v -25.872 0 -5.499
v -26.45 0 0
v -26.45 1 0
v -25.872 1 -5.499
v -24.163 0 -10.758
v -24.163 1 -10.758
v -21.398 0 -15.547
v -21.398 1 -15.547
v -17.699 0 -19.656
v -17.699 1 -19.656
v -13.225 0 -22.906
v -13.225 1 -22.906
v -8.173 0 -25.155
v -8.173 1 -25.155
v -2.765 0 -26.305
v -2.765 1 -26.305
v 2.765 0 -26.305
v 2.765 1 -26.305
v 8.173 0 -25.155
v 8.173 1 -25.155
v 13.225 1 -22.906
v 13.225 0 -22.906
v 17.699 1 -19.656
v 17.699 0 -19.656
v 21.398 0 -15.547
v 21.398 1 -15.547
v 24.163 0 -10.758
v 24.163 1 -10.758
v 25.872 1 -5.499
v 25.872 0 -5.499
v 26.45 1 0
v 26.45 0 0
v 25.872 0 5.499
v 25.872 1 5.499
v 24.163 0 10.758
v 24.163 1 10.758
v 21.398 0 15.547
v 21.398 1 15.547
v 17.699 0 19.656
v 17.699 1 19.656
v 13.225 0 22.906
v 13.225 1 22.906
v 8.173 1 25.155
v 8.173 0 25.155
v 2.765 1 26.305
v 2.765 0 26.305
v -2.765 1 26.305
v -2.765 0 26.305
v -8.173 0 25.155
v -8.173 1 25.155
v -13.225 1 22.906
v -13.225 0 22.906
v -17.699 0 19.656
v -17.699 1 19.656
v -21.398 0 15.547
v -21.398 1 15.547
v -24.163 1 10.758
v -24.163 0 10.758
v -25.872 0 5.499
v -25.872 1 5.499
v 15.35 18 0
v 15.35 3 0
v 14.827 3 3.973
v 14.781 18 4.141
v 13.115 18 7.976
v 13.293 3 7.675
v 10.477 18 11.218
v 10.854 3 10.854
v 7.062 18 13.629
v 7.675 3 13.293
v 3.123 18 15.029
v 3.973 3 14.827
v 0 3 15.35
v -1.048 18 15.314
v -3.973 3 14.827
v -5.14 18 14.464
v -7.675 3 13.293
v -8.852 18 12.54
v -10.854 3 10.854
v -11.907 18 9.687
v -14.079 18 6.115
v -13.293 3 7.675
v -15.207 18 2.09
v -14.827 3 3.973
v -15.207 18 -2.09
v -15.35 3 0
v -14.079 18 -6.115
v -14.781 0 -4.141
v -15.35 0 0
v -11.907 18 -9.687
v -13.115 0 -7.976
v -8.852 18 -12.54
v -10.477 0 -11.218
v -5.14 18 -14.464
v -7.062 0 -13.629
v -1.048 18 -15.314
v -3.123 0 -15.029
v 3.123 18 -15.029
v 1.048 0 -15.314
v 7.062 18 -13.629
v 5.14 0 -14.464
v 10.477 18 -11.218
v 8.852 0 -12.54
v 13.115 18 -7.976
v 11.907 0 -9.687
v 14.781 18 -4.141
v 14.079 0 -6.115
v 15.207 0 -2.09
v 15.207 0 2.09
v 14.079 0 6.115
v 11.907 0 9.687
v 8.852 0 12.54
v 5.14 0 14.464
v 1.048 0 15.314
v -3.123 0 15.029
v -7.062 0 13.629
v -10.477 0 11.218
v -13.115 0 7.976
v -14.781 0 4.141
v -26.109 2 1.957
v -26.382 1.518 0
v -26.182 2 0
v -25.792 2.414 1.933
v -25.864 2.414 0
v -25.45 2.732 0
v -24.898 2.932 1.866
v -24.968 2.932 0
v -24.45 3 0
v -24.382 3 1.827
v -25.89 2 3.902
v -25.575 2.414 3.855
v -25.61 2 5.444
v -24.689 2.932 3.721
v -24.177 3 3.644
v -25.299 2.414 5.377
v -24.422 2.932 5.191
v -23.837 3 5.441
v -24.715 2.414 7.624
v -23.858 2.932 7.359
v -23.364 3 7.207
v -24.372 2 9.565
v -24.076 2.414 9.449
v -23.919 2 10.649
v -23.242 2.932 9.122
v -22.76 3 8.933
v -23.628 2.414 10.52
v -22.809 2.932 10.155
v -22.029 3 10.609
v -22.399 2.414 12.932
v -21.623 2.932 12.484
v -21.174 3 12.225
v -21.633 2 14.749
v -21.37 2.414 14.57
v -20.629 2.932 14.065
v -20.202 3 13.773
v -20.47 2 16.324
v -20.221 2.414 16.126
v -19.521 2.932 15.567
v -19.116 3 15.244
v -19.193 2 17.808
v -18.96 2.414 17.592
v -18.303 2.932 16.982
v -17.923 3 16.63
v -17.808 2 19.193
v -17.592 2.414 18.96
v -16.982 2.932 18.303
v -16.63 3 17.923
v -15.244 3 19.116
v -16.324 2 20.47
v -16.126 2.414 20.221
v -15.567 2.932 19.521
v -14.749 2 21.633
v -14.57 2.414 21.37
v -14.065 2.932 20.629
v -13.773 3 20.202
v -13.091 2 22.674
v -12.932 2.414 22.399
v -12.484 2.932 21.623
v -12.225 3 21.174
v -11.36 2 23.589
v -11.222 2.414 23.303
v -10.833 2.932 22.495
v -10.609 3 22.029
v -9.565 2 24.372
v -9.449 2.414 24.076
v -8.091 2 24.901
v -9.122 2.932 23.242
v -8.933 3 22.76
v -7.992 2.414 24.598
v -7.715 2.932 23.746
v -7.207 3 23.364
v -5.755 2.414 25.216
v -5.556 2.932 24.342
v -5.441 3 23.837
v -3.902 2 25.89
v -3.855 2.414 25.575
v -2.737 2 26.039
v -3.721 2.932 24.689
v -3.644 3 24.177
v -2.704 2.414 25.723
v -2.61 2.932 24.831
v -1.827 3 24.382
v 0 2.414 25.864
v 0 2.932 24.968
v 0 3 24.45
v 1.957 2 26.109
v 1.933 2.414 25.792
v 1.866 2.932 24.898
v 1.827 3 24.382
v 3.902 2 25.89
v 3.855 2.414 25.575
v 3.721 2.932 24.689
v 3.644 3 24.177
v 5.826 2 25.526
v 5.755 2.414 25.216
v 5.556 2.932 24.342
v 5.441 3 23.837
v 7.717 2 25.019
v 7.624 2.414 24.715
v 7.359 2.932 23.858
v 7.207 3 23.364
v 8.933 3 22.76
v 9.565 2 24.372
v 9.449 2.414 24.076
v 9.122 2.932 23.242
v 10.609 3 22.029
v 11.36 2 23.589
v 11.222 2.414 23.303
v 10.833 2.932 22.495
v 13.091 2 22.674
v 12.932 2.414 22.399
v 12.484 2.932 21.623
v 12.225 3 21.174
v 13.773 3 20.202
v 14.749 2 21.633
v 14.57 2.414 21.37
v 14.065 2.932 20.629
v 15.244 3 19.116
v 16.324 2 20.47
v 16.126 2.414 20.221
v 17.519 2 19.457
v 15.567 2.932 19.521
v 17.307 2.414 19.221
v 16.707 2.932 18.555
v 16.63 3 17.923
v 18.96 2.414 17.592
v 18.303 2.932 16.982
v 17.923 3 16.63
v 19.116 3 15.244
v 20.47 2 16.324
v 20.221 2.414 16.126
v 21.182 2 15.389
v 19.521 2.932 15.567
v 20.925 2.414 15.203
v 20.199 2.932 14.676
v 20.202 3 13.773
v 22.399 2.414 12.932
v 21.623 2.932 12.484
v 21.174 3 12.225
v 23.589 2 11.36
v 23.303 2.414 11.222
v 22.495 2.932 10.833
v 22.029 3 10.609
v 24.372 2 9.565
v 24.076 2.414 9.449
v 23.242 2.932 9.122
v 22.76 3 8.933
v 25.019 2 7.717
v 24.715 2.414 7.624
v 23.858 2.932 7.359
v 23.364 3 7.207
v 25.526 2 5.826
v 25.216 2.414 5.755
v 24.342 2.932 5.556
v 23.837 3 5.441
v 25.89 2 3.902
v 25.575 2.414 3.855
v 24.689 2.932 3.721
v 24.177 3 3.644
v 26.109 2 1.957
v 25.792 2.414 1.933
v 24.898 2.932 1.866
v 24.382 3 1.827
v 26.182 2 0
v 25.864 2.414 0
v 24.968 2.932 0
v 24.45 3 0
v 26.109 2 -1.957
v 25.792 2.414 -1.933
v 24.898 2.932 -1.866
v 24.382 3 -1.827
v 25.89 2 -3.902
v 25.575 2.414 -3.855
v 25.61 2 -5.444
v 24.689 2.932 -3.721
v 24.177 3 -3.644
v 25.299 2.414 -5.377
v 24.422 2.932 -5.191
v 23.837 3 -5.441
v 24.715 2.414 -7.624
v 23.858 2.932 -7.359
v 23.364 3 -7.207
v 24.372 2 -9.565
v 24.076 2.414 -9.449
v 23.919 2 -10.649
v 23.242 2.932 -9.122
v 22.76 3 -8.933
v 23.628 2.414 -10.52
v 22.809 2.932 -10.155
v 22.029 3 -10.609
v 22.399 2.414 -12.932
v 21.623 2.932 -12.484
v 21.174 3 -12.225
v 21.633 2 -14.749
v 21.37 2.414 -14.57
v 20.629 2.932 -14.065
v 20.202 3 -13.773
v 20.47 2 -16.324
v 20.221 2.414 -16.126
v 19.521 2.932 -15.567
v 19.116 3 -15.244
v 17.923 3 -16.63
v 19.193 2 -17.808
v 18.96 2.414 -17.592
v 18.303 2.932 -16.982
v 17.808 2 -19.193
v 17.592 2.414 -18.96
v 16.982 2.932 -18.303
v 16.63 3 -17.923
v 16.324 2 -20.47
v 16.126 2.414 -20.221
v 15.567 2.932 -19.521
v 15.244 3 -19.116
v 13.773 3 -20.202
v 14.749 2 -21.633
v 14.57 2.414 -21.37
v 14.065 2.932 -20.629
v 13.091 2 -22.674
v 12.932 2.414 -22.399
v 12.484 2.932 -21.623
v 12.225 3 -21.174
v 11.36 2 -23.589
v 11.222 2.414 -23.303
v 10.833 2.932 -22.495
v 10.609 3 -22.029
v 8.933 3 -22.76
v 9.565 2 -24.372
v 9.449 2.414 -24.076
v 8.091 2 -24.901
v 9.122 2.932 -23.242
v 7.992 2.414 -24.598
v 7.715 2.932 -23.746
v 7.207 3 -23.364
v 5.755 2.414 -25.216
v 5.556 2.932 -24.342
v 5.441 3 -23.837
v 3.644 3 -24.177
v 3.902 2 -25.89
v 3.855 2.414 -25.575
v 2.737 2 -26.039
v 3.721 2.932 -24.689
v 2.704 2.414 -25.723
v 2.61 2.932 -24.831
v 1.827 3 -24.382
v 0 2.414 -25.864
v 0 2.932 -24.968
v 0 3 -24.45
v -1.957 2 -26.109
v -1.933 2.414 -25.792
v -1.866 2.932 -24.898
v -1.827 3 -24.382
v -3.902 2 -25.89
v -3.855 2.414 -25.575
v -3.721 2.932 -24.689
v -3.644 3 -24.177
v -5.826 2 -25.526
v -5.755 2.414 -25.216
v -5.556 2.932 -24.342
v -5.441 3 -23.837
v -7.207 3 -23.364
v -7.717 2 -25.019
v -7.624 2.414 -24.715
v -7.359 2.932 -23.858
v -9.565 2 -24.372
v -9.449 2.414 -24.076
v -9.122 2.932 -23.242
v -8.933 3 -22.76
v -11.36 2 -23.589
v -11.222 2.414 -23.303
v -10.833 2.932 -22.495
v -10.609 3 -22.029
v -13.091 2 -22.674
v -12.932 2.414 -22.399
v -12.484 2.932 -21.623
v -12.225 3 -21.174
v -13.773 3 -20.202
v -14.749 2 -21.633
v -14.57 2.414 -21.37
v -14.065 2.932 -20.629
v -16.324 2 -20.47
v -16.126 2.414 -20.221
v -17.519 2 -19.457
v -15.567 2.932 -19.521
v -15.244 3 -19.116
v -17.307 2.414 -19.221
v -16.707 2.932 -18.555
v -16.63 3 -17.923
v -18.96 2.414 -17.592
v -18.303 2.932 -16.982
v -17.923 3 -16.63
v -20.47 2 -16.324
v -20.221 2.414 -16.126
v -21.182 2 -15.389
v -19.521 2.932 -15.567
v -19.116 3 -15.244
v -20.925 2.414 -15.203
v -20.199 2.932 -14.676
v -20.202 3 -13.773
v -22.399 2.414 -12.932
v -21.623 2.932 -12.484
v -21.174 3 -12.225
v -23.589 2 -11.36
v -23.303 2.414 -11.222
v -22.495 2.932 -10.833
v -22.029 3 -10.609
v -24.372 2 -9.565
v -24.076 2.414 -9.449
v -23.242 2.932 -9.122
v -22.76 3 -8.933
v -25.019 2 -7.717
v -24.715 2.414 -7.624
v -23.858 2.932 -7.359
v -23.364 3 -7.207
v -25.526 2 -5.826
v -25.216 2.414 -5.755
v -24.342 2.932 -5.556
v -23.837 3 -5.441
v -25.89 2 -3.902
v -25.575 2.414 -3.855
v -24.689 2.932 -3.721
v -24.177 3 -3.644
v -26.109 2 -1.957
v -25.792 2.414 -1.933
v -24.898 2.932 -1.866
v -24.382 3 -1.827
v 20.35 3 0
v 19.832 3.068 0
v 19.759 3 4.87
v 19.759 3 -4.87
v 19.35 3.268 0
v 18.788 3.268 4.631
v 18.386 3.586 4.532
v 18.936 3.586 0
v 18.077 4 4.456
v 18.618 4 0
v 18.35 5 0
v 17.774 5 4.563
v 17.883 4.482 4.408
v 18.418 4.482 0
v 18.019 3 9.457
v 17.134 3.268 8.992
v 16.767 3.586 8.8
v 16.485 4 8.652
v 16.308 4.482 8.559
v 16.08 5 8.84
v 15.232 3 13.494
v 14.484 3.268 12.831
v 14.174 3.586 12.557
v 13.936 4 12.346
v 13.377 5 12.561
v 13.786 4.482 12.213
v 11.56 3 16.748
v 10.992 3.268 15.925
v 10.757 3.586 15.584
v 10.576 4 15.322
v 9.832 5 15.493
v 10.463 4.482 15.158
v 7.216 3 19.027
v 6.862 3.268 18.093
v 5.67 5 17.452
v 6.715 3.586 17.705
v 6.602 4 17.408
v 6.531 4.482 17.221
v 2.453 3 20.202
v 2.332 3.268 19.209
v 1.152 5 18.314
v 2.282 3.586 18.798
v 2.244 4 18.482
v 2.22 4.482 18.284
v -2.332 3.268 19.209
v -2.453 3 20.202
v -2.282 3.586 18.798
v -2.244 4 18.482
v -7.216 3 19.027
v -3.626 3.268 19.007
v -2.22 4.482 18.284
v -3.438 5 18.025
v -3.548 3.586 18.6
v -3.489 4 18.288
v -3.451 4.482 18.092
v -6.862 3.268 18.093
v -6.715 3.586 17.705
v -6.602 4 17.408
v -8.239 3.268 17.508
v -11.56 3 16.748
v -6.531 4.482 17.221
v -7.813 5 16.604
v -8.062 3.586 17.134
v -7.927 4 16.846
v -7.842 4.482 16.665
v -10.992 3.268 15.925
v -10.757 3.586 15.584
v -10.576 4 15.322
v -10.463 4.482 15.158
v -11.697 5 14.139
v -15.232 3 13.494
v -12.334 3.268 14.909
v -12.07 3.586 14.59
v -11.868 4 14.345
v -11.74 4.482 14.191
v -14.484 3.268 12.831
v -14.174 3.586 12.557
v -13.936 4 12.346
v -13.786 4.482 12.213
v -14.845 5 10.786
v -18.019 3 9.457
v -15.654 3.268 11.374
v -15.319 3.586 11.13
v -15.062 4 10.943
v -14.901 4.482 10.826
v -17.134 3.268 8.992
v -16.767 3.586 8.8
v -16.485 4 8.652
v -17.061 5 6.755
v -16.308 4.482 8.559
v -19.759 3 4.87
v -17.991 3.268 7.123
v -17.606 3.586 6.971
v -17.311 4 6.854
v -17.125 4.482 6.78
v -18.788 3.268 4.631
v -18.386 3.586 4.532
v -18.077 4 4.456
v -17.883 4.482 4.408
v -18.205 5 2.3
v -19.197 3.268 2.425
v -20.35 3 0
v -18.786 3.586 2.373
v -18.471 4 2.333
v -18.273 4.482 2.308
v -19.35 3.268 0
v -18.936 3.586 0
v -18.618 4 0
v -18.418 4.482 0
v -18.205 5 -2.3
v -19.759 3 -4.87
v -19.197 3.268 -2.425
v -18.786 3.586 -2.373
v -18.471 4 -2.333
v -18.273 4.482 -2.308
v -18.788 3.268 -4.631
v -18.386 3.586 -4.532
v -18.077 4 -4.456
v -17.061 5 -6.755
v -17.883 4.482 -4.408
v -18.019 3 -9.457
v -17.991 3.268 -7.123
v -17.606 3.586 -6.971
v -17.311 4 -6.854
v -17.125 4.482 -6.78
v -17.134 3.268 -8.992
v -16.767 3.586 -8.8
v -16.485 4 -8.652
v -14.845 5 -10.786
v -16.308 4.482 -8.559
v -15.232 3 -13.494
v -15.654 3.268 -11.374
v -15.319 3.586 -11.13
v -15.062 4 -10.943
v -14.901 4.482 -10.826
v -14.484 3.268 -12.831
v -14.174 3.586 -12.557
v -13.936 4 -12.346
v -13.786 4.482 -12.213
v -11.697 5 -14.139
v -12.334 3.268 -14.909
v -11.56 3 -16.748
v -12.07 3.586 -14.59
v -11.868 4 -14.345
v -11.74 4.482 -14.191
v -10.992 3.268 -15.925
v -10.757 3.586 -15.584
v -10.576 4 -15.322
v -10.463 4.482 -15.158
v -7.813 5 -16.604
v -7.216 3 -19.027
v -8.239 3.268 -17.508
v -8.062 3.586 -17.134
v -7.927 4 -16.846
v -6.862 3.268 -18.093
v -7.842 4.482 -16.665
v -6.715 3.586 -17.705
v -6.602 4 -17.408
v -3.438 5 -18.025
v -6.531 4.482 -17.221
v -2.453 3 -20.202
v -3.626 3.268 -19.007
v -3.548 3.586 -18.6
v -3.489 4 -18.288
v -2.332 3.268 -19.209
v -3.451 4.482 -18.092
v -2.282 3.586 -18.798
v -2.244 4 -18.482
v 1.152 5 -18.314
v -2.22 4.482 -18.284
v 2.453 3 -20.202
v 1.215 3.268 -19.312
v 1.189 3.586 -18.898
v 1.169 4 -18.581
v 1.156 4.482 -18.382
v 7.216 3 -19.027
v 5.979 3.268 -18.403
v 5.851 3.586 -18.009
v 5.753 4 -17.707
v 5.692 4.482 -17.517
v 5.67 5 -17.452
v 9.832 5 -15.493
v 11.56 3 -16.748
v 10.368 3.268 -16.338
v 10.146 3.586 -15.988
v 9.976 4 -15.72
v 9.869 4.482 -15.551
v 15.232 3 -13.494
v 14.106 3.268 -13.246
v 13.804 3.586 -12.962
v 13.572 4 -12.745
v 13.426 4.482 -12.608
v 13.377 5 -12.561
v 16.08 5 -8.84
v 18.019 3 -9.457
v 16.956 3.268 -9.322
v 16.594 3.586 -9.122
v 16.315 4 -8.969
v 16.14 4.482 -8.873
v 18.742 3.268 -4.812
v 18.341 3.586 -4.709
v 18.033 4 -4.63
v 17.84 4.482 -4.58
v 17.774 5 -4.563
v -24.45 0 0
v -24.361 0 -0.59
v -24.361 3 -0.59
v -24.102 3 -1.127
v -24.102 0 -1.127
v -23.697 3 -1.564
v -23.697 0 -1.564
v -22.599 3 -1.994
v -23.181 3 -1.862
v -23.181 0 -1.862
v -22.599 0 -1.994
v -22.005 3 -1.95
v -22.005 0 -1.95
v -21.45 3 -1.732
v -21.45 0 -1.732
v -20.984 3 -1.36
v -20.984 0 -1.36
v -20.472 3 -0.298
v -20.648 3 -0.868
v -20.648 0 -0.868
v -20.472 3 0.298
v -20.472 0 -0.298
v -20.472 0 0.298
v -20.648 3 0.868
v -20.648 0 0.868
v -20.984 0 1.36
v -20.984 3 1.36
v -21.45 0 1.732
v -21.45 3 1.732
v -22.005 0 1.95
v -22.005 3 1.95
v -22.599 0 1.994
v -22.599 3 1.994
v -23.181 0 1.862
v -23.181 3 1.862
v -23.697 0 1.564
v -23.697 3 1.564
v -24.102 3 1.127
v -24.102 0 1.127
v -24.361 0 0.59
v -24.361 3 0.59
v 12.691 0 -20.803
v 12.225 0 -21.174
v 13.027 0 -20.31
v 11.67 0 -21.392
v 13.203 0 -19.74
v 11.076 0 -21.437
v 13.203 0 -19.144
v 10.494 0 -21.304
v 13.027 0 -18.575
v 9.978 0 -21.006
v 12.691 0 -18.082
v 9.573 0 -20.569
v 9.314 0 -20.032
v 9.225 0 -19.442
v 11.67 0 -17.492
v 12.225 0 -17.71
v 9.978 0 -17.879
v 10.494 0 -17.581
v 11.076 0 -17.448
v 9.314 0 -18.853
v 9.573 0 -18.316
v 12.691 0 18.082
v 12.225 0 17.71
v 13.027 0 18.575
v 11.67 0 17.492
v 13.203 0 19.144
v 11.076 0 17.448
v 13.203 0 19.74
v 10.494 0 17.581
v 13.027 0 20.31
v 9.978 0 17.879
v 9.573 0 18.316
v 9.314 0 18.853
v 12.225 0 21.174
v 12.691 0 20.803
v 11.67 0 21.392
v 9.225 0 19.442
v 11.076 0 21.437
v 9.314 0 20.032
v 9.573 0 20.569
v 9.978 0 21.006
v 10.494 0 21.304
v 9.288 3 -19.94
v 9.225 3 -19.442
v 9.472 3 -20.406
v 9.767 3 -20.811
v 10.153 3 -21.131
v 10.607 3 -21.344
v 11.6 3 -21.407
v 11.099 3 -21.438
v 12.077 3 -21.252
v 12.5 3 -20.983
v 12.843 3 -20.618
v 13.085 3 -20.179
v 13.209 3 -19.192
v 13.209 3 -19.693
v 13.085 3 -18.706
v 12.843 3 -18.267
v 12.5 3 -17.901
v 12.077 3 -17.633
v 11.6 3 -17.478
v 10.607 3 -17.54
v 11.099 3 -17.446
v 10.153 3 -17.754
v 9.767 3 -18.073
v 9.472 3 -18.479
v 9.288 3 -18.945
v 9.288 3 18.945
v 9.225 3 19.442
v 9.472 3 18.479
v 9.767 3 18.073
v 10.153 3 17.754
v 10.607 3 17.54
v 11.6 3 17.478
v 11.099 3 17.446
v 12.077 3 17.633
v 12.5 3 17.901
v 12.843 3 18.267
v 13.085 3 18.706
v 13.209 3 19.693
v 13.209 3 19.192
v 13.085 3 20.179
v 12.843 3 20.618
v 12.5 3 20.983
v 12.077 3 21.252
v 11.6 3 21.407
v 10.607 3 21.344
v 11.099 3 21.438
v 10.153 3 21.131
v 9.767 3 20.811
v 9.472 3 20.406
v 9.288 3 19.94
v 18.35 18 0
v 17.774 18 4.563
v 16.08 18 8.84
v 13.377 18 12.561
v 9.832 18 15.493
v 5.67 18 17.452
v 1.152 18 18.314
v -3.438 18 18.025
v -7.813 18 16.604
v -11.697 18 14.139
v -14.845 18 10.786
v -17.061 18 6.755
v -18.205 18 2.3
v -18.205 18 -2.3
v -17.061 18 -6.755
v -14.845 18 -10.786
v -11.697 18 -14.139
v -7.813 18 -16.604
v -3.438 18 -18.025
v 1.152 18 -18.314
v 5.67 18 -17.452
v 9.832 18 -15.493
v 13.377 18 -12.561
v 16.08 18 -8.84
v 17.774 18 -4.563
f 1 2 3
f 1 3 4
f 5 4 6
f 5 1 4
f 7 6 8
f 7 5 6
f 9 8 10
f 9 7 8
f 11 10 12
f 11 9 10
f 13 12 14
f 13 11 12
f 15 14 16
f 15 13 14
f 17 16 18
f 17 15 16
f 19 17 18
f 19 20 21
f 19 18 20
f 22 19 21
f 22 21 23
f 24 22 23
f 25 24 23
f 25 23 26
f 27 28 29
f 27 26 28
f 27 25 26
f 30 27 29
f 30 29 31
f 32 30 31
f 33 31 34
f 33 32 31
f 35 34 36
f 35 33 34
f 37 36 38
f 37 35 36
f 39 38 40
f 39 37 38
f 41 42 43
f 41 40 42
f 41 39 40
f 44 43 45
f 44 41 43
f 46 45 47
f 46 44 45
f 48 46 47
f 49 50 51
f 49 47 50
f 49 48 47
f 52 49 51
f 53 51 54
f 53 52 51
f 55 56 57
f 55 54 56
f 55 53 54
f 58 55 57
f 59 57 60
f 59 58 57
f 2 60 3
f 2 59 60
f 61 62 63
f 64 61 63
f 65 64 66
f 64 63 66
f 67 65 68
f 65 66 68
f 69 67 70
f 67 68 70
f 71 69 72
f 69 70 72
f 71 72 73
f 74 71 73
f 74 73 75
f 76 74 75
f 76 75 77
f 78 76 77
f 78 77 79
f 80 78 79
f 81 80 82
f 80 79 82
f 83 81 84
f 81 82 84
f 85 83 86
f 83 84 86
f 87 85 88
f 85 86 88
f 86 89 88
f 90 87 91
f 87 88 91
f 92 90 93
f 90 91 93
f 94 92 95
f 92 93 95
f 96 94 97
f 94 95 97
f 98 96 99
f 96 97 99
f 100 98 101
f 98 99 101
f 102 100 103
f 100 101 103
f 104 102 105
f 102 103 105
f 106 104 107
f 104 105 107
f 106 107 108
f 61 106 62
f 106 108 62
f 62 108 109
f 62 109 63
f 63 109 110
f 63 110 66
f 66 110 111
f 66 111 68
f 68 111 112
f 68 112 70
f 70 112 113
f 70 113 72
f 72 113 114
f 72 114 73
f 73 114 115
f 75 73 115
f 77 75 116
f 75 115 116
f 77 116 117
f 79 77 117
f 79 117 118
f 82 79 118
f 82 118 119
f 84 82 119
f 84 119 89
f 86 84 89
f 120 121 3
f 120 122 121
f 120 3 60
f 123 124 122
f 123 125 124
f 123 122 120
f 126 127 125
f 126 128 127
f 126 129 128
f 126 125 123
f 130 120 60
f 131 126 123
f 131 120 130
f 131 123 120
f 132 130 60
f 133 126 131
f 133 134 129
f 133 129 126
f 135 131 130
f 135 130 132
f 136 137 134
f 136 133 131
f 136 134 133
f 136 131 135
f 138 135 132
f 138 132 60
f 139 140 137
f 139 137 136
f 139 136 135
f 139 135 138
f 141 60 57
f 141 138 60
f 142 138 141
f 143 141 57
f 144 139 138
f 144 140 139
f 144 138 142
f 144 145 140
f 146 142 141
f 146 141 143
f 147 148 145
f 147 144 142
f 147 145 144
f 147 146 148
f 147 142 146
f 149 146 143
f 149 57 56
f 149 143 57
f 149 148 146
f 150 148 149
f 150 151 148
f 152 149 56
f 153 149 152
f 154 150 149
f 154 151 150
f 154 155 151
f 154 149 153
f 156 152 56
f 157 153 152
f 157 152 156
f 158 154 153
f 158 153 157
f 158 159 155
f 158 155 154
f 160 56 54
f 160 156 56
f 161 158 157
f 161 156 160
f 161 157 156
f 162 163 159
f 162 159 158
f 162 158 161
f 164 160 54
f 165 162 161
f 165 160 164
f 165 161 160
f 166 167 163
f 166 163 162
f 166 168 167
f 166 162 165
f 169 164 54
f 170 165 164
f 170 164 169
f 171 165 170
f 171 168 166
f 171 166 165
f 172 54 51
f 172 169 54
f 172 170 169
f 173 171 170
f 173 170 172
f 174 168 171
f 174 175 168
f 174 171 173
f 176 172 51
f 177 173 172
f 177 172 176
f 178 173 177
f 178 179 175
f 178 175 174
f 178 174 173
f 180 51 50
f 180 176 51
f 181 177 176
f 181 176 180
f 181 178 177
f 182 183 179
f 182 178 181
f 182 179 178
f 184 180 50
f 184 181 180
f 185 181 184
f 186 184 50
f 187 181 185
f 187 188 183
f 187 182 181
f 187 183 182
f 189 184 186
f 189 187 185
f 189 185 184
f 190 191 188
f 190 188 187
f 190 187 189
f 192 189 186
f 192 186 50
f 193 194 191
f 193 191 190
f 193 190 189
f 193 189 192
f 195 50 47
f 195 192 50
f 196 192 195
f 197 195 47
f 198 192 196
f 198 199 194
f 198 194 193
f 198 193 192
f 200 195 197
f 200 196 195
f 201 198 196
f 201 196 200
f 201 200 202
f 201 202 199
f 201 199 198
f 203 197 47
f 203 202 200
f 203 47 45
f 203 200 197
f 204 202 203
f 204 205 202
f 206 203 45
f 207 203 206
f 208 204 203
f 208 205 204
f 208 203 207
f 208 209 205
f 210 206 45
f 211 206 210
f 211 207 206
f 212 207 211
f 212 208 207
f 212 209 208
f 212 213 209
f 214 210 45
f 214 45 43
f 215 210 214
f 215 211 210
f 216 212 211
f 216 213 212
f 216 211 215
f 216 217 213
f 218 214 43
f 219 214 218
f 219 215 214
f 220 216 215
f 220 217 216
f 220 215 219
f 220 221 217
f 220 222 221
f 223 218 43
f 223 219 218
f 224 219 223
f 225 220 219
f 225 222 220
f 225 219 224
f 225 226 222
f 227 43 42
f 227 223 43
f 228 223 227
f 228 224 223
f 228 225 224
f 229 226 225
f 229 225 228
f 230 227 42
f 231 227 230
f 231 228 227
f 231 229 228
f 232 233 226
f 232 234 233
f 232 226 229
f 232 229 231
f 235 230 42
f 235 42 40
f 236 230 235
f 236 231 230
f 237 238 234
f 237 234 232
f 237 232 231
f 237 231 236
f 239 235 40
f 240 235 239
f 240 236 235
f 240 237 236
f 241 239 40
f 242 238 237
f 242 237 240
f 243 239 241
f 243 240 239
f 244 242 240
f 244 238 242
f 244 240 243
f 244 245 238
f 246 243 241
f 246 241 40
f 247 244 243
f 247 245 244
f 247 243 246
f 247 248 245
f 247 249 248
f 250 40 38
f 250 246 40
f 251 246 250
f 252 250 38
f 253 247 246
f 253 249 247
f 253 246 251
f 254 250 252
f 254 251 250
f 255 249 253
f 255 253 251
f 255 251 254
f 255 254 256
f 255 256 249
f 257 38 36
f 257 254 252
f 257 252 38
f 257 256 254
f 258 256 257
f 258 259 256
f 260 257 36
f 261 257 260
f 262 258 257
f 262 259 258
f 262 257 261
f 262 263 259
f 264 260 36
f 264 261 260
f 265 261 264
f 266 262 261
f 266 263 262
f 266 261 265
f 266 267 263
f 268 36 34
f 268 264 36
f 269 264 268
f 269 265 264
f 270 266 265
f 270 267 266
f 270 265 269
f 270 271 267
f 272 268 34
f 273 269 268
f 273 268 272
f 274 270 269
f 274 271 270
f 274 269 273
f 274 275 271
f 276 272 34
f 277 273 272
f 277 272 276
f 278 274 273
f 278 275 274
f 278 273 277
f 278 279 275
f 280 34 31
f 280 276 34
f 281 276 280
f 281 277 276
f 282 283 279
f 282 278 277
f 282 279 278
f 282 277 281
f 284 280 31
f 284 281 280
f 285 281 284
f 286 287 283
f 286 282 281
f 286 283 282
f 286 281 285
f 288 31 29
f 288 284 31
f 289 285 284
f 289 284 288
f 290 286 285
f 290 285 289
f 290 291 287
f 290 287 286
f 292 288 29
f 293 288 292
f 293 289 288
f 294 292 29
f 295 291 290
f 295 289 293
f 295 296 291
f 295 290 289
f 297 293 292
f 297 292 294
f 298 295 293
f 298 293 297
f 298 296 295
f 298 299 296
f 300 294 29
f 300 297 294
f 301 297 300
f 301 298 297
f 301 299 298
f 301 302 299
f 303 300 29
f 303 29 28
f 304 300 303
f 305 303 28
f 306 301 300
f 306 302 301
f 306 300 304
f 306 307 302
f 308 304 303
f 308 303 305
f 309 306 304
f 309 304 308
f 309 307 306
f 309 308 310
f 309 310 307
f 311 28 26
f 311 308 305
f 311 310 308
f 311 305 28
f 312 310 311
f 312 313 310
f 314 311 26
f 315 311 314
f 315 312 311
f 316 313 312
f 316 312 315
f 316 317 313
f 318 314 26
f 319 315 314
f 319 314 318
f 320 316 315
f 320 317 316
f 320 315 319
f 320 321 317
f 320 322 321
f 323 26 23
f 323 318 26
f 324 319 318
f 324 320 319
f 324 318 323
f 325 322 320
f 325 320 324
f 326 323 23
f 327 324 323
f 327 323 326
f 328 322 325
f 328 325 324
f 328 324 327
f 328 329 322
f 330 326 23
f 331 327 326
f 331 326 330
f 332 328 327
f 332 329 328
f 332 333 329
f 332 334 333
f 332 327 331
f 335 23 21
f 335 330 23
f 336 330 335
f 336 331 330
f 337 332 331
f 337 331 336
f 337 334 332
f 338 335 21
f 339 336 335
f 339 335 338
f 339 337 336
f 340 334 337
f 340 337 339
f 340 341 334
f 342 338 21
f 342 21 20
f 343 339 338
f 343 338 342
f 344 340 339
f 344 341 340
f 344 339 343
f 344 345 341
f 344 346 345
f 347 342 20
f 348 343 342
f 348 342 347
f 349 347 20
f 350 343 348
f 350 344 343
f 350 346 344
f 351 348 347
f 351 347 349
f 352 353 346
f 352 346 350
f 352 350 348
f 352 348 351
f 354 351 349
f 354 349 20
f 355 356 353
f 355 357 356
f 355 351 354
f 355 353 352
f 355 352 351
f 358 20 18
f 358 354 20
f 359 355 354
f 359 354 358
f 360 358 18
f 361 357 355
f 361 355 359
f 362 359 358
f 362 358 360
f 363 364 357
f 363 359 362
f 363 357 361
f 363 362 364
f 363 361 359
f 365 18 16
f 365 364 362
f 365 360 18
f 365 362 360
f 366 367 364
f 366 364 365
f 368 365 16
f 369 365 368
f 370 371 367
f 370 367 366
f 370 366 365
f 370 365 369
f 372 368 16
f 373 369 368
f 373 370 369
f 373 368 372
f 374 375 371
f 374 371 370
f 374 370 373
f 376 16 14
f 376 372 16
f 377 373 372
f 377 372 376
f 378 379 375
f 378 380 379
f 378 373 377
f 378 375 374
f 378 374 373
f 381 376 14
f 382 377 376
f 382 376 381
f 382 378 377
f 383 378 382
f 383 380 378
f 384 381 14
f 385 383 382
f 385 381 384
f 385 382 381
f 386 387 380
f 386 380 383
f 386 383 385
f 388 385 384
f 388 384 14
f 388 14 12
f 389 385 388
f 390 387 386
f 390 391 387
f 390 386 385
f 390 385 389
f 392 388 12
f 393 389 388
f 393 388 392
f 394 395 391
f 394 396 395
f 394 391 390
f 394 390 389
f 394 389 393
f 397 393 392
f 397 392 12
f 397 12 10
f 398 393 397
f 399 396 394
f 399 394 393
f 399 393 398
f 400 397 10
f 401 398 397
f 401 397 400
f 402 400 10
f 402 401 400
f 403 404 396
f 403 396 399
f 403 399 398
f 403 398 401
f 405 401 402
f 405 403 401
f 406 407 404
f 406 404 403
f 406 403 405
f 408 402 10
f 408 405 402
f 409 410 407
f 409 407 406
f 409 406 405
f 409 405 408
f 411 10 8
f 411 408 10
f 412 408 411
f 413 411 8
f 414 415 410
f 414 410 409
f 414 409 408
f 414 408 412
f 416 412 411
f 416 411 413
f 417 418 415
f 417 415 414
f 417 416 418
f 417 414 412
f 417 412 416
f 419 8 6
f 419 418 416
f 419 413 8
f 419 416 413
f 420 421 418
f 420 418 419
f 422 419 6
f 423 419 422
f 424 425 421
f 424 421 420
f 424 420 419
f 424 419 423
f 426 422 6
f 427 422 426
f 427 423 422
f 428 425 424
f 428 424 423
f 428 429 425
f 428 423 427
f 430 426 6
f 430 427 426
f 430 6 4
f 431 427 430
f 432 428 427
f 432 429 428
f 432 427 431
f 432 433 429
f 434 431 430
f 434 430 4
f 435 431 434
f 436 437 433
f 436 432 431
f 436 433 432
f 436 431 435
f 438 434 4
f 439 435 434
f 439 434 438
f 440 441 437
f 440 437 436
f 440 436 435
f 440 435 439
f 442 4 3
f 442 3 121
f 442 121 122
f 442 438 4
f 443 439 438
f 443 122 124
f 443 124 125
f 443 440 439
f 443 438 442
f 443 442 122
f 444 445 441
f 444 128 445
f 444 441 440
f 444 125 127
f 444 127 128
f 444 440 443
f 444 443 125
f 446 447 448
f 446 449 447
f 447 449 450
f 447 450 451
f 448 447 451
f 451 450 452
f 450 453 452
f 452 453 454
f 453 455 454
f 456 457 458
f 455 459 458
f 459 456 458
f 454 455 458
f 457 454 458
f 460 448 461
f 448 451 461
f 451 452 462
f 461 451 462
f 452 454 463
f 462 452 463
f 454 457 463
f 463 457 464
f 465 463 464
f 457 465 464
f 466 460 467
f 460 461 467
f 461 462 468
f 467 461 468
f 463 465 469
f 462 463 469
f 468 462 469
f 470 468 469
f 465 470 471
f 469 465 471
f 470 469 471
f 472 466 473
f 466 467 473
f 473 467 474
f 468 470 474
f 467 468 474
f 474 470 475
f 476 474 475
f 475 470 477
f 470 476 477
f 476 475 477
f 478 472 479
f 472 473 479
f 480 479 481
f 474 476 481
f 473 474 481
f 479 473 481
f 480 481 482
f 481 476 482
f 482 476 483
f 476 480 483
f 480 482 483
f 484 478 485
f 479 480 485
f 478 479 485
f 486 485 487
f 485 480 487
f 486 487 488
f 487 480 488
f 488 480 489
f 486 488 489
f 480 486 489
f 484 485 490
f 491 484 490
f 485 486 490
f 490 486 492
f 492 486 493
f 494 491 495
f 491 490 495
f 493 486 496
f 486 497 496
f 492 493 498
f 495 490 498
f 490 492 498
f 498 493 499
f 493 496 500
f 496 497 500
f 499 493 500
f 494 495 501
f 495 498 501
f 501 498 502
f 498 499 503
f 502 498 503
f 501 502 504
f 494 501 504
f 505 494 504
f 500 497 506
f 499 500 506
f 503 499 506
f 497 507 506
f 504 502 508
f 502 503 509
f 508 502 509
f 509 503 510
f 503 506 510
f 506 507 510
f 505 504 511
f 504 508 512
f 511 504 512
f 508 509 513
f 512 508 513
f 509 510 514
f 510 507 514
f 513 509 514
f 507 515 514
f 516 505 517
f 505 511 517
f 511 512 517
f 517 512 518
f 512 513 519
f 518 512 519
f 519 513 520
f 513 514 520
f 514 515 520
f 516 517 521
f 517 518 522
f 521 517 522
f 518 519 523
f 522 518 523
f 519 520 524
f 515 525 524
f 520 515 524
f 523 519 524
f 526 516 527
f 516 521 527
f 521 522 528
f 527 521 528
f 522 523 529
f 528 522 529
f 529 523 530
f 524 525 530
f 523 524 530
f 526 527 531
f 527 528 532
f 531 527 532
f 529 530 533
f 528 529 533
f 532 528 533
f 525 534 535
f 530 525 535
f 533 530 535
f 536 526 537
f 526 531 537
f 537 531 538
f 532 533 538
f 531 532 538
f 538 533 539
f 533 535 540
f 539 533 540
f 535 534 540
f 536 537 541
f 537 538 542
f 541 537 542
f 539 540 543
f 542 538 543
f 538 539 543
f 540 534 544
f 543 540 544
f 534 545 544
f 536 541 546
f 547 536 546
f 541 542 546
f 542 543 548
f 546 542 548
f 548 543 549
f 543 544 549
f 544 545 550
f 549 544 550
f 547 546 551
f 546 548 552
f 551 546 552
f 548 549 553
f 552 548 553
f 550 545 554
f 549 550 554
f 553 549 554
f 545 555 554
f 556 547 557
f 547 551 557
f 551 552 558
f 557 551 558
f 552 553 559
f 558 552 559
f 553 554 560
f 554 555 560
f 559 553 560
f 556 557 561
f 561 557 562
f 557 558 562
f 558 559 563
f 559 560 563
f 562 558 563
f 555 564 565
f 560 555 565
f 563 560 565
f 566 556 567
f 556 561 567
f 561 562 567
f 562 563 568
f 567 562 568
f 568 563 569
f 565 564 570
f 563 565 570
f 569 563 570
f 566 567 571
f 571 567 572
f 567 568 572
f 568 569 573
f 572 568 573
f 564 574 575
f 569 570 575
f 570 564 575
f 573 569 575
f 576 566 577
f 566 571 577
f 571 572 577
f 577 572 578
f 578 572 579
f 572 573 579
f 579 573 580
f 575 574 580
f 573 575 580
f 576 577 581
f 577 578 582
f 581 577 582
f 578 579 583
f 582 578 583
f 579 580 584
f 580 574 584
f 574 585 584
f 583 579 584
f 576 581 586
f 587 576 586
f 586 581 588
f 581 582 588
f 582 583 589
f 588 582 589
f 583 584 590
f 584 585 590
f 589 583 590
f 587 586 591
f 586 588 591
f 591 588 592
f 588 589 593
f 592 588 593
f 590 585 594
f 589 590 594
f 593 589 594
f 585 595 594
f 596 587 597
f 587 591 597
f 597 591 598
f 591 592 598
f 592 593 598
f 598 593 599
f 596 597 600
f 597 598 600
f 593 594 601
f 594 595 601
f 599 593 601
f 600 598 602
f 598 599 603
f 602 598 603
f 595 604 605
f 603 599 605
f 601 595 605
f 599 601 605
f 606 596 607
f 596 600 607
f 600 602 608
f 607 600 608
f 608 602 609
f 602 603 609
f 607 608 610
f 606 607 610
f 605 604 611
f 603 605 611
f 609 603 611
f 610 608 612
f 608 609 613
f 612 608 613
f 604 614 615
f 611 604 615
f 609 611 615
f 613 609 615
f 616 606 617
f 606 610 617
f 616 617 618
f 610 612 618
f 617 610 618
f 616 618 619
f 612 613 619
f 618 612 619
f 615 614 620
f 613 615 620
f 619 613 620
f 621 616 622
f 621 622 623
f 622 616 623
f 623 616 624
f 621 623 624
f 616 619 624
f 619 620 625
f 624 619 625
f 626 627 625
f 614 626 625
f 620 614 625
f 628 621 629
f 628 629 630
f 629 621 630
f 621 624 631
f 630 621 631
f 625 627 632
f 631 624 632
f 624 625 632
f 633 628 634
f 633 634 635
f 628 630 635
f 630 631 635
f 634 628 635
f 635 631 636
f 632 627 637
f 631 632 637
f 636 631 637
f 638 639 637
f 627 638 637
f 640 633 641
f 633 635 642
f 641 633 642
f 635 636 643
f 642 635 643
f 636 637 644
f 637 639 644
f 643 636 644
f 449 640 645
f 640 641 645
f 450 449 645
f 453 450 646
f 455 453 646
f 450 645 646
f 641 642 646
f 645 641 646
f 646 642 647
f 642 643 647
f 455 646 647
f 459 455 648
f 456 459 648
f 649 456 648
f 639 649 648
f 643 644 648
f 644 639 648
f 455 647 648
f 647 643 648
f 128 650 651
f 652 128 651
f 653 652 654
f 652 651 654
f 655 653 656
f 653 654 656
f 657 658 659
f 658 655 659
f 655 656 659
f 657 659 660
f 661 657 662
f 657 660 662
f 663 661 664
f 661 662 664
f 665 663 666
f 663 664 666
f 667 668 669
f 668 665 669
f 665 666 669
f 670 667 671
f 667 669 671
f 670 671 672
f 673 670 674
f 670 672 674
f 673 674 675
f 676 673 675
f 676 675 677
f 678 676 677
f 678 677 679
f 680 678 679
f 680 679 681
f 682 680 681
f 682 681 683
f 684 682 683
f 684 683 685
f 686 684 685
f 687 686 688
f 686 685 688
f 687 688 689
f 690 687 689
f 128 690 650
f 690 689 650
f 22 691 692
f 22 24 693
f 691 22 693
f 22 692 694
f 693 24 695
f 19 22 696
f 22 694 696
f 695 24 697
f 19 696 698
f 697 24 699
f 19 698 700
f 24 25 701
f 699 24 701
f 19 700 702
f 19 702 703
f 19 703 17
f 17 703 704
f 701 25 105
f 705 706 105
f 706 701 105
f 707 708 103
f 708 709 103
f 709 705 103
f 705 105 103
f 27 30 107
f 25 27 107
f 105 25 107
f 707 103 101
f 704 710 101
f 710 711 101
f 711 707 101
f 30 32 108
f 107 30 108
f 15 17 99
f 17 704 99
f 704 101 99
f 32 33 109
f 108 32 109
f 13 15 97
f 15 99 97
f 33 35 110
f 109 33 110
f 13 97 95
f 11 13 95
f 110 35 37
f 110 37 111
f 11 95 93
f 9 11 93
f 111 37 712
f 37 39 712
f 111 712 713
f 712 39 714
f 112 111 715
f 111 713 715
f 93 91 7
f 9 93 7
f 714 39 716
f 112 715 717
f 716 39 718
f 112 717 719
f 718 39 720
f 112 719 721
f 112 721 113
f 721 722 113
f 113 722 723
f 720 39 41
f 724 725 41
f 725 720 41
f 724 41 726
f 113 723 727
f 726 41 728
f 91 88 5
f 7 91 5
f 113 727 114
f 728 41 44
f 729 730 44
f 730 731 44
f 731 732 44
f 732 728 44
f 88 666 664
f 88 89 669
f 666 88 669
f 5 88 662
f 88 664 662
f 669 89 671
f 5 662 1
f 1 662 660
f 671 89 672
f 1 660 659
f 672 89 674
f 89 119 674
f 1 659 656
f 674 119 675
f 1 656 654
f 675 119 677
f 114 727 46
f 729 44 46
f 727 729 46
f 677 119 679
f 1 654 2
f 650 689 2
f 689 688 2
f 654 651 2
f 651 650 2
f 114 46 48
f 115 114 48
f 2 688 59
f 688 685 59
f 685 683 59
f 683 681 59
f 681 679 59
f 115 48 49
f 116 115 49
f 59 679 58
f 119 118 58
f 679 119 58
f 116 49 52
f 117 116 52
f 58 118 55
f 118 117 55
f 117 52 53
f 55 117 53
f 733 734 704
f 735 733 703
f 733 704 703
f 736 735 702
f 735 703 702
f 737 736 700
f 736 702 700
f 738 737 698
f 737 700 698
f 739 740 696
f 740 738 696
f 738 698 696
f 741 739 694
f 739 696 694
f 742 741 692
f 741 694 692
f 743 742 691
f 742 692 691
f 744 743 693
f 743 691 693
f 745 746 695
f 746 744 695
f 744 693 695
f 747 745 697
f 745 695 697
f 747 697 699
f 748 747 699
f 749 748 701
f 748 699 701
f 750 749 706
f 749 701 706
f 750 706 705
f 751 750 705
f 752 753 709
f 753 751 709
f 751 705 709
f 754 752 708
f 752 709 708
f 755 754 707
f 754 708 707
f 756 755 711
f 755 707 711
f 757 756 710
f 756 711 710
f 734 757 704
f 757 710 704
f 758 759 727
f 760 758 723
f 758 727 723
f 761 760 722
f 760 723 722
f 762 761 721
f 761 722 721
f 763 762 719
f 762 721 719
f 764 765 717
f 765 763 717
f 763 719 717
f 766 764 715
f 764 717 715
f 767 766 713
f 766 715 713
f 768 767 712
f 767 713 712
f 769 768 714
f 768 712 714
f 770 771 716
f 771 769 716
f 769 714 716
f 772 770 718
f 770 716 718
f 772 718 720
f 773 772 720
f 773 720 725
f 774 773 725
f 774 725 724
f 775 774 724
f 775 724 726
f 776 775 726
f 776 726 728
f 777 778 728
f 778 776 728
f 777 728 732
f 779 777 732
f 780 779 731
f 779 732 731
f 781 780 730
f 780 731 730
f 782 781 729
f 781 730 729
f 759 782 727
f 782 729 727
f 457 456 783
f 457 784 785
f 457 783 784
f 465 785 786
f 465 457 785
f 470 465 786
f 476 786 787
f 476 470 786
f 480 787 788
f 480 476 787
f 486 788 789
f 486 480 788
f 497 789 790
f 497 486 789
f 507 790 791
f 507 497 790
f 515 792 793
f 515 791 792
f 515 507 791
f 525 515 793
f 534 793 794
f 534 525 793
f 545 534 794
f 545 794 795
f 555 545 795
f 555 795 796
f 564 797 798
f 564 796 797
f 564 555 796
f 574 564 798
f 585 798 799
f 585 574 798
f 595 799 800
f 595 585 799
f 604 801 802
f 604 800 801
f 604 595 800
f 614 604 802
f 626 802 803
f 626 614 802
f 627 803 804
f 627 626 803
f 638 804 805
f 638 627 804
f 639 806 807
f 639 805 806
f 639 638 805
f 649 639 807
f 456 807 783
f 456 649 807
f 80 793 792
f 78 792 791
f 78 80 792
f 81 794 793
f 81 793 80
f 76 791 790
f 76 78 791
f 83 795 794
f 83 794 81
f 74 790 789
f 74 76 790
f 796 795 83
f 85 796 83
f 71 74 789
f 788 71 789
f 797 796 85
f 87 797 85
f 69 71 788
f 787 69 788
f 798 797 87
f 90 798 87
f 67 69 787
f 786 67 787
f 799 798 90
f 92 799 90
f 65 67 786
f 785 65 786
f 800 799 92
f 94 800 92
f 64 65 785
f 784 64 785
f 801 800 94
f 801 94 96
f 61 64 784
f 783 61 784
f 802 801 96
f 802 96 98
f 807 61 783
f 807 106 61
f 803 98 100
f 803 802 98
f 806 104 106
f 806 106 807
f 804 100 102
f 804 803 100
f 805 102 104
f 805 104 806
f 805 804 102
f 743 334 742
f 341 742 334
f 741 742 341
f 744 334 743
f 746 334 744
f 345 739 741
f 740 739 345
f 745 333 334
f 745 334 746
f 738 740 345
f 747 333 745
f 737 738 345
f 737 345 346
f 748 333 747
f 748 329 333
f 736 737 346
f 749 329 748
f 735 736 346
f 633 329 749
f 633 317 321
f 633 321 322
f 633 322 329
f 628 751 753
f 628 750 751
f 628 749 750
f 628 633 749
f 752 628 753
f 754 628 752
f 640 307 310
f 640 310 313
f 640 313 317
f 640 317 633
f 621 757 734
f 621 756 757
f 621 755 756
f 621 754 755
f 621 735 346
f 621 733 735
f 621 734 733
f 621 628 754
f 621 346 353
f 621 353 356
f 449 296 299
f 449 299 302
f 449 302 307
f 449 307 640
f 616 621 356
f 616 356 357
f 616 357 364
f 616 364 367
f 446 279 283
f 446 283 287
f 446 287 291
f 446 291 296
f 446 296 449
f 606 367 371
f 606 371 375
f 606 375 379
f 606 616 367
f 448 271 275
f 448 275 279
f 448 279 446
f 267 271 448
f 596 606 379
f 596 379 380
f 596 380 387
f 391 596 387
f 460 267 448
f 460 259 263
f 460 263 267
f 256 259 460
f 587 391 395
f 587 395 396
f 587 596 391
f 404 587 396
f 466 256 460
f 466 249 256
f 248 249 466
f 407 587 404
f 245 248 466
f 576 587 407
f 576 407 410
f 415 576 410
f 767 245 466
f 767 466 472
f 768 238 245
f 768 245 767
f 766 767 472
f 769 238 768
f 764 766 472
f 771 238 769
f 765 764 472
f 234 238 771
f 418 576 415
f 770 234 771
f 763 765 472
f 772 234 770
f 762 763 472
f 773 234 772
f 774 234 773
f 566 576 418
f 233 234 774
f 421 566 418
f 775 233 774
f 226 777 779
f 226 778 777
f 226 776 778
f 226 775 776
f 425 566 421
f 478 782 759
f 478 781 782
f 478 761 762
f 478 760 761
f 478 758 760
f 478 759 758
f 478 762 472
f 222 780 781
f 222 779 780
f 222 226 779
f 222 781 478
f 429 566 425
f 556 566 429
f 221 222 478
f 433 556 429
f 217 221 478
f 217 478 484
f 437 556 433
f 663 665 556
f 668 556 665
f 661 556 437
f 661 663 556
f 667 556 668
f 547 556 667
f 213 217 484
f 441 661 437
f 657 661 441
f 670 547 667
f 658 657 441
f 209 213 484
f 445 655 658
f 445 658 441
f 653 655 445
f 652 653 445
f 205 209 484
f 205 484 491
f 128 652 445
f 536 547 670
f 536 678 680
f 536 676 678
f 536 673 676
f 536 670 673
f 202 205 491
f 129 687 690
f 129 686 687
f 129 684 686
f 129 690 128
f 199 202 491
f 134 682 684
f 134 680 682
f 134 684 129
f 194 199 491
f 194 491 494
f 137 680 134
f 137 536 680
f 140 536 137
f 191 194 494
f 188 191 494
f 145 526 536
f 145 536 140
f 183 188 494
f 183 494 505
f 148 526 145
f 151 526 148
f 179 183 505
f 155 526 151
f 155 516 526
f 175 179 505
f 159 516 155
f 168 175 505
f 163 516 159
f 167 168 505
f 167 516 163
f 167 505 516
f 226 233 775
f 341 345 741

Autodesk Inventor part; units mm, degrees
ref_plane "YZ Plane" through (0, 0, 0) normal (1, 0, 0) x (0, 1, 0)
ref_plane "XZ Plane" through (0, 0, 0) normal (0, 1, 0) x (-1, 0, 0)
ref_plane "XY Plane" through (0, 0, 0) normal (0, 0, 1) x (1, 0, 0)
sketch "Sketch1" plane through (0, 0, 0) normal (0, 1, 0) x (-1, 0, 0)
  circle A0 centre (0, 0) radius 26.45
  circle A1 centre (22.45, 0) radius 2
  circle A2 centre (0, 0) radius 22.45 construction
  circle A3 centre (-11.225, 19.4423) radius 2
  circle A4 centre (-11.225, -19.4423) radius 2
  circle A5 centre (0, 0) radius 15.35
  dimension "d0" = 52.9
  dimension "d1" = 4
  dimension "d2" = 4
  dimension "d5" = 360
  dimension "d7" = 30.7
extrude "Extrusion1" add sketch "Sketch1" along normal blind 3
sketch "Sketch2" plane through (0, 3, 0) normal (0, 1, 0) x (1, 0, 0)
  circle A0 centre (0, 0) radius 15.35 projected
  circle A1 centre (11.225, 19.4423) radius 2 projected
  circle A2 centre (11.225, -19.4423) radius 2 projected
  circle A3 centre (-22.45, 0) radius 2 projected
  circle A4 centre (0, 0) radius 26.45 projected
  circle A5 centre (0, 0) radius 18.35
  dimension "d10" = 3
extrude "Extrusion2" add sketch "Sketch2" along normal blind 15 contours A5
fillet "Fillet1" radius 2 2 edges at (-18.35, 3, 0) (26.45, 3, 0)
properties part number "00_Zeiss_eyepieceport"
